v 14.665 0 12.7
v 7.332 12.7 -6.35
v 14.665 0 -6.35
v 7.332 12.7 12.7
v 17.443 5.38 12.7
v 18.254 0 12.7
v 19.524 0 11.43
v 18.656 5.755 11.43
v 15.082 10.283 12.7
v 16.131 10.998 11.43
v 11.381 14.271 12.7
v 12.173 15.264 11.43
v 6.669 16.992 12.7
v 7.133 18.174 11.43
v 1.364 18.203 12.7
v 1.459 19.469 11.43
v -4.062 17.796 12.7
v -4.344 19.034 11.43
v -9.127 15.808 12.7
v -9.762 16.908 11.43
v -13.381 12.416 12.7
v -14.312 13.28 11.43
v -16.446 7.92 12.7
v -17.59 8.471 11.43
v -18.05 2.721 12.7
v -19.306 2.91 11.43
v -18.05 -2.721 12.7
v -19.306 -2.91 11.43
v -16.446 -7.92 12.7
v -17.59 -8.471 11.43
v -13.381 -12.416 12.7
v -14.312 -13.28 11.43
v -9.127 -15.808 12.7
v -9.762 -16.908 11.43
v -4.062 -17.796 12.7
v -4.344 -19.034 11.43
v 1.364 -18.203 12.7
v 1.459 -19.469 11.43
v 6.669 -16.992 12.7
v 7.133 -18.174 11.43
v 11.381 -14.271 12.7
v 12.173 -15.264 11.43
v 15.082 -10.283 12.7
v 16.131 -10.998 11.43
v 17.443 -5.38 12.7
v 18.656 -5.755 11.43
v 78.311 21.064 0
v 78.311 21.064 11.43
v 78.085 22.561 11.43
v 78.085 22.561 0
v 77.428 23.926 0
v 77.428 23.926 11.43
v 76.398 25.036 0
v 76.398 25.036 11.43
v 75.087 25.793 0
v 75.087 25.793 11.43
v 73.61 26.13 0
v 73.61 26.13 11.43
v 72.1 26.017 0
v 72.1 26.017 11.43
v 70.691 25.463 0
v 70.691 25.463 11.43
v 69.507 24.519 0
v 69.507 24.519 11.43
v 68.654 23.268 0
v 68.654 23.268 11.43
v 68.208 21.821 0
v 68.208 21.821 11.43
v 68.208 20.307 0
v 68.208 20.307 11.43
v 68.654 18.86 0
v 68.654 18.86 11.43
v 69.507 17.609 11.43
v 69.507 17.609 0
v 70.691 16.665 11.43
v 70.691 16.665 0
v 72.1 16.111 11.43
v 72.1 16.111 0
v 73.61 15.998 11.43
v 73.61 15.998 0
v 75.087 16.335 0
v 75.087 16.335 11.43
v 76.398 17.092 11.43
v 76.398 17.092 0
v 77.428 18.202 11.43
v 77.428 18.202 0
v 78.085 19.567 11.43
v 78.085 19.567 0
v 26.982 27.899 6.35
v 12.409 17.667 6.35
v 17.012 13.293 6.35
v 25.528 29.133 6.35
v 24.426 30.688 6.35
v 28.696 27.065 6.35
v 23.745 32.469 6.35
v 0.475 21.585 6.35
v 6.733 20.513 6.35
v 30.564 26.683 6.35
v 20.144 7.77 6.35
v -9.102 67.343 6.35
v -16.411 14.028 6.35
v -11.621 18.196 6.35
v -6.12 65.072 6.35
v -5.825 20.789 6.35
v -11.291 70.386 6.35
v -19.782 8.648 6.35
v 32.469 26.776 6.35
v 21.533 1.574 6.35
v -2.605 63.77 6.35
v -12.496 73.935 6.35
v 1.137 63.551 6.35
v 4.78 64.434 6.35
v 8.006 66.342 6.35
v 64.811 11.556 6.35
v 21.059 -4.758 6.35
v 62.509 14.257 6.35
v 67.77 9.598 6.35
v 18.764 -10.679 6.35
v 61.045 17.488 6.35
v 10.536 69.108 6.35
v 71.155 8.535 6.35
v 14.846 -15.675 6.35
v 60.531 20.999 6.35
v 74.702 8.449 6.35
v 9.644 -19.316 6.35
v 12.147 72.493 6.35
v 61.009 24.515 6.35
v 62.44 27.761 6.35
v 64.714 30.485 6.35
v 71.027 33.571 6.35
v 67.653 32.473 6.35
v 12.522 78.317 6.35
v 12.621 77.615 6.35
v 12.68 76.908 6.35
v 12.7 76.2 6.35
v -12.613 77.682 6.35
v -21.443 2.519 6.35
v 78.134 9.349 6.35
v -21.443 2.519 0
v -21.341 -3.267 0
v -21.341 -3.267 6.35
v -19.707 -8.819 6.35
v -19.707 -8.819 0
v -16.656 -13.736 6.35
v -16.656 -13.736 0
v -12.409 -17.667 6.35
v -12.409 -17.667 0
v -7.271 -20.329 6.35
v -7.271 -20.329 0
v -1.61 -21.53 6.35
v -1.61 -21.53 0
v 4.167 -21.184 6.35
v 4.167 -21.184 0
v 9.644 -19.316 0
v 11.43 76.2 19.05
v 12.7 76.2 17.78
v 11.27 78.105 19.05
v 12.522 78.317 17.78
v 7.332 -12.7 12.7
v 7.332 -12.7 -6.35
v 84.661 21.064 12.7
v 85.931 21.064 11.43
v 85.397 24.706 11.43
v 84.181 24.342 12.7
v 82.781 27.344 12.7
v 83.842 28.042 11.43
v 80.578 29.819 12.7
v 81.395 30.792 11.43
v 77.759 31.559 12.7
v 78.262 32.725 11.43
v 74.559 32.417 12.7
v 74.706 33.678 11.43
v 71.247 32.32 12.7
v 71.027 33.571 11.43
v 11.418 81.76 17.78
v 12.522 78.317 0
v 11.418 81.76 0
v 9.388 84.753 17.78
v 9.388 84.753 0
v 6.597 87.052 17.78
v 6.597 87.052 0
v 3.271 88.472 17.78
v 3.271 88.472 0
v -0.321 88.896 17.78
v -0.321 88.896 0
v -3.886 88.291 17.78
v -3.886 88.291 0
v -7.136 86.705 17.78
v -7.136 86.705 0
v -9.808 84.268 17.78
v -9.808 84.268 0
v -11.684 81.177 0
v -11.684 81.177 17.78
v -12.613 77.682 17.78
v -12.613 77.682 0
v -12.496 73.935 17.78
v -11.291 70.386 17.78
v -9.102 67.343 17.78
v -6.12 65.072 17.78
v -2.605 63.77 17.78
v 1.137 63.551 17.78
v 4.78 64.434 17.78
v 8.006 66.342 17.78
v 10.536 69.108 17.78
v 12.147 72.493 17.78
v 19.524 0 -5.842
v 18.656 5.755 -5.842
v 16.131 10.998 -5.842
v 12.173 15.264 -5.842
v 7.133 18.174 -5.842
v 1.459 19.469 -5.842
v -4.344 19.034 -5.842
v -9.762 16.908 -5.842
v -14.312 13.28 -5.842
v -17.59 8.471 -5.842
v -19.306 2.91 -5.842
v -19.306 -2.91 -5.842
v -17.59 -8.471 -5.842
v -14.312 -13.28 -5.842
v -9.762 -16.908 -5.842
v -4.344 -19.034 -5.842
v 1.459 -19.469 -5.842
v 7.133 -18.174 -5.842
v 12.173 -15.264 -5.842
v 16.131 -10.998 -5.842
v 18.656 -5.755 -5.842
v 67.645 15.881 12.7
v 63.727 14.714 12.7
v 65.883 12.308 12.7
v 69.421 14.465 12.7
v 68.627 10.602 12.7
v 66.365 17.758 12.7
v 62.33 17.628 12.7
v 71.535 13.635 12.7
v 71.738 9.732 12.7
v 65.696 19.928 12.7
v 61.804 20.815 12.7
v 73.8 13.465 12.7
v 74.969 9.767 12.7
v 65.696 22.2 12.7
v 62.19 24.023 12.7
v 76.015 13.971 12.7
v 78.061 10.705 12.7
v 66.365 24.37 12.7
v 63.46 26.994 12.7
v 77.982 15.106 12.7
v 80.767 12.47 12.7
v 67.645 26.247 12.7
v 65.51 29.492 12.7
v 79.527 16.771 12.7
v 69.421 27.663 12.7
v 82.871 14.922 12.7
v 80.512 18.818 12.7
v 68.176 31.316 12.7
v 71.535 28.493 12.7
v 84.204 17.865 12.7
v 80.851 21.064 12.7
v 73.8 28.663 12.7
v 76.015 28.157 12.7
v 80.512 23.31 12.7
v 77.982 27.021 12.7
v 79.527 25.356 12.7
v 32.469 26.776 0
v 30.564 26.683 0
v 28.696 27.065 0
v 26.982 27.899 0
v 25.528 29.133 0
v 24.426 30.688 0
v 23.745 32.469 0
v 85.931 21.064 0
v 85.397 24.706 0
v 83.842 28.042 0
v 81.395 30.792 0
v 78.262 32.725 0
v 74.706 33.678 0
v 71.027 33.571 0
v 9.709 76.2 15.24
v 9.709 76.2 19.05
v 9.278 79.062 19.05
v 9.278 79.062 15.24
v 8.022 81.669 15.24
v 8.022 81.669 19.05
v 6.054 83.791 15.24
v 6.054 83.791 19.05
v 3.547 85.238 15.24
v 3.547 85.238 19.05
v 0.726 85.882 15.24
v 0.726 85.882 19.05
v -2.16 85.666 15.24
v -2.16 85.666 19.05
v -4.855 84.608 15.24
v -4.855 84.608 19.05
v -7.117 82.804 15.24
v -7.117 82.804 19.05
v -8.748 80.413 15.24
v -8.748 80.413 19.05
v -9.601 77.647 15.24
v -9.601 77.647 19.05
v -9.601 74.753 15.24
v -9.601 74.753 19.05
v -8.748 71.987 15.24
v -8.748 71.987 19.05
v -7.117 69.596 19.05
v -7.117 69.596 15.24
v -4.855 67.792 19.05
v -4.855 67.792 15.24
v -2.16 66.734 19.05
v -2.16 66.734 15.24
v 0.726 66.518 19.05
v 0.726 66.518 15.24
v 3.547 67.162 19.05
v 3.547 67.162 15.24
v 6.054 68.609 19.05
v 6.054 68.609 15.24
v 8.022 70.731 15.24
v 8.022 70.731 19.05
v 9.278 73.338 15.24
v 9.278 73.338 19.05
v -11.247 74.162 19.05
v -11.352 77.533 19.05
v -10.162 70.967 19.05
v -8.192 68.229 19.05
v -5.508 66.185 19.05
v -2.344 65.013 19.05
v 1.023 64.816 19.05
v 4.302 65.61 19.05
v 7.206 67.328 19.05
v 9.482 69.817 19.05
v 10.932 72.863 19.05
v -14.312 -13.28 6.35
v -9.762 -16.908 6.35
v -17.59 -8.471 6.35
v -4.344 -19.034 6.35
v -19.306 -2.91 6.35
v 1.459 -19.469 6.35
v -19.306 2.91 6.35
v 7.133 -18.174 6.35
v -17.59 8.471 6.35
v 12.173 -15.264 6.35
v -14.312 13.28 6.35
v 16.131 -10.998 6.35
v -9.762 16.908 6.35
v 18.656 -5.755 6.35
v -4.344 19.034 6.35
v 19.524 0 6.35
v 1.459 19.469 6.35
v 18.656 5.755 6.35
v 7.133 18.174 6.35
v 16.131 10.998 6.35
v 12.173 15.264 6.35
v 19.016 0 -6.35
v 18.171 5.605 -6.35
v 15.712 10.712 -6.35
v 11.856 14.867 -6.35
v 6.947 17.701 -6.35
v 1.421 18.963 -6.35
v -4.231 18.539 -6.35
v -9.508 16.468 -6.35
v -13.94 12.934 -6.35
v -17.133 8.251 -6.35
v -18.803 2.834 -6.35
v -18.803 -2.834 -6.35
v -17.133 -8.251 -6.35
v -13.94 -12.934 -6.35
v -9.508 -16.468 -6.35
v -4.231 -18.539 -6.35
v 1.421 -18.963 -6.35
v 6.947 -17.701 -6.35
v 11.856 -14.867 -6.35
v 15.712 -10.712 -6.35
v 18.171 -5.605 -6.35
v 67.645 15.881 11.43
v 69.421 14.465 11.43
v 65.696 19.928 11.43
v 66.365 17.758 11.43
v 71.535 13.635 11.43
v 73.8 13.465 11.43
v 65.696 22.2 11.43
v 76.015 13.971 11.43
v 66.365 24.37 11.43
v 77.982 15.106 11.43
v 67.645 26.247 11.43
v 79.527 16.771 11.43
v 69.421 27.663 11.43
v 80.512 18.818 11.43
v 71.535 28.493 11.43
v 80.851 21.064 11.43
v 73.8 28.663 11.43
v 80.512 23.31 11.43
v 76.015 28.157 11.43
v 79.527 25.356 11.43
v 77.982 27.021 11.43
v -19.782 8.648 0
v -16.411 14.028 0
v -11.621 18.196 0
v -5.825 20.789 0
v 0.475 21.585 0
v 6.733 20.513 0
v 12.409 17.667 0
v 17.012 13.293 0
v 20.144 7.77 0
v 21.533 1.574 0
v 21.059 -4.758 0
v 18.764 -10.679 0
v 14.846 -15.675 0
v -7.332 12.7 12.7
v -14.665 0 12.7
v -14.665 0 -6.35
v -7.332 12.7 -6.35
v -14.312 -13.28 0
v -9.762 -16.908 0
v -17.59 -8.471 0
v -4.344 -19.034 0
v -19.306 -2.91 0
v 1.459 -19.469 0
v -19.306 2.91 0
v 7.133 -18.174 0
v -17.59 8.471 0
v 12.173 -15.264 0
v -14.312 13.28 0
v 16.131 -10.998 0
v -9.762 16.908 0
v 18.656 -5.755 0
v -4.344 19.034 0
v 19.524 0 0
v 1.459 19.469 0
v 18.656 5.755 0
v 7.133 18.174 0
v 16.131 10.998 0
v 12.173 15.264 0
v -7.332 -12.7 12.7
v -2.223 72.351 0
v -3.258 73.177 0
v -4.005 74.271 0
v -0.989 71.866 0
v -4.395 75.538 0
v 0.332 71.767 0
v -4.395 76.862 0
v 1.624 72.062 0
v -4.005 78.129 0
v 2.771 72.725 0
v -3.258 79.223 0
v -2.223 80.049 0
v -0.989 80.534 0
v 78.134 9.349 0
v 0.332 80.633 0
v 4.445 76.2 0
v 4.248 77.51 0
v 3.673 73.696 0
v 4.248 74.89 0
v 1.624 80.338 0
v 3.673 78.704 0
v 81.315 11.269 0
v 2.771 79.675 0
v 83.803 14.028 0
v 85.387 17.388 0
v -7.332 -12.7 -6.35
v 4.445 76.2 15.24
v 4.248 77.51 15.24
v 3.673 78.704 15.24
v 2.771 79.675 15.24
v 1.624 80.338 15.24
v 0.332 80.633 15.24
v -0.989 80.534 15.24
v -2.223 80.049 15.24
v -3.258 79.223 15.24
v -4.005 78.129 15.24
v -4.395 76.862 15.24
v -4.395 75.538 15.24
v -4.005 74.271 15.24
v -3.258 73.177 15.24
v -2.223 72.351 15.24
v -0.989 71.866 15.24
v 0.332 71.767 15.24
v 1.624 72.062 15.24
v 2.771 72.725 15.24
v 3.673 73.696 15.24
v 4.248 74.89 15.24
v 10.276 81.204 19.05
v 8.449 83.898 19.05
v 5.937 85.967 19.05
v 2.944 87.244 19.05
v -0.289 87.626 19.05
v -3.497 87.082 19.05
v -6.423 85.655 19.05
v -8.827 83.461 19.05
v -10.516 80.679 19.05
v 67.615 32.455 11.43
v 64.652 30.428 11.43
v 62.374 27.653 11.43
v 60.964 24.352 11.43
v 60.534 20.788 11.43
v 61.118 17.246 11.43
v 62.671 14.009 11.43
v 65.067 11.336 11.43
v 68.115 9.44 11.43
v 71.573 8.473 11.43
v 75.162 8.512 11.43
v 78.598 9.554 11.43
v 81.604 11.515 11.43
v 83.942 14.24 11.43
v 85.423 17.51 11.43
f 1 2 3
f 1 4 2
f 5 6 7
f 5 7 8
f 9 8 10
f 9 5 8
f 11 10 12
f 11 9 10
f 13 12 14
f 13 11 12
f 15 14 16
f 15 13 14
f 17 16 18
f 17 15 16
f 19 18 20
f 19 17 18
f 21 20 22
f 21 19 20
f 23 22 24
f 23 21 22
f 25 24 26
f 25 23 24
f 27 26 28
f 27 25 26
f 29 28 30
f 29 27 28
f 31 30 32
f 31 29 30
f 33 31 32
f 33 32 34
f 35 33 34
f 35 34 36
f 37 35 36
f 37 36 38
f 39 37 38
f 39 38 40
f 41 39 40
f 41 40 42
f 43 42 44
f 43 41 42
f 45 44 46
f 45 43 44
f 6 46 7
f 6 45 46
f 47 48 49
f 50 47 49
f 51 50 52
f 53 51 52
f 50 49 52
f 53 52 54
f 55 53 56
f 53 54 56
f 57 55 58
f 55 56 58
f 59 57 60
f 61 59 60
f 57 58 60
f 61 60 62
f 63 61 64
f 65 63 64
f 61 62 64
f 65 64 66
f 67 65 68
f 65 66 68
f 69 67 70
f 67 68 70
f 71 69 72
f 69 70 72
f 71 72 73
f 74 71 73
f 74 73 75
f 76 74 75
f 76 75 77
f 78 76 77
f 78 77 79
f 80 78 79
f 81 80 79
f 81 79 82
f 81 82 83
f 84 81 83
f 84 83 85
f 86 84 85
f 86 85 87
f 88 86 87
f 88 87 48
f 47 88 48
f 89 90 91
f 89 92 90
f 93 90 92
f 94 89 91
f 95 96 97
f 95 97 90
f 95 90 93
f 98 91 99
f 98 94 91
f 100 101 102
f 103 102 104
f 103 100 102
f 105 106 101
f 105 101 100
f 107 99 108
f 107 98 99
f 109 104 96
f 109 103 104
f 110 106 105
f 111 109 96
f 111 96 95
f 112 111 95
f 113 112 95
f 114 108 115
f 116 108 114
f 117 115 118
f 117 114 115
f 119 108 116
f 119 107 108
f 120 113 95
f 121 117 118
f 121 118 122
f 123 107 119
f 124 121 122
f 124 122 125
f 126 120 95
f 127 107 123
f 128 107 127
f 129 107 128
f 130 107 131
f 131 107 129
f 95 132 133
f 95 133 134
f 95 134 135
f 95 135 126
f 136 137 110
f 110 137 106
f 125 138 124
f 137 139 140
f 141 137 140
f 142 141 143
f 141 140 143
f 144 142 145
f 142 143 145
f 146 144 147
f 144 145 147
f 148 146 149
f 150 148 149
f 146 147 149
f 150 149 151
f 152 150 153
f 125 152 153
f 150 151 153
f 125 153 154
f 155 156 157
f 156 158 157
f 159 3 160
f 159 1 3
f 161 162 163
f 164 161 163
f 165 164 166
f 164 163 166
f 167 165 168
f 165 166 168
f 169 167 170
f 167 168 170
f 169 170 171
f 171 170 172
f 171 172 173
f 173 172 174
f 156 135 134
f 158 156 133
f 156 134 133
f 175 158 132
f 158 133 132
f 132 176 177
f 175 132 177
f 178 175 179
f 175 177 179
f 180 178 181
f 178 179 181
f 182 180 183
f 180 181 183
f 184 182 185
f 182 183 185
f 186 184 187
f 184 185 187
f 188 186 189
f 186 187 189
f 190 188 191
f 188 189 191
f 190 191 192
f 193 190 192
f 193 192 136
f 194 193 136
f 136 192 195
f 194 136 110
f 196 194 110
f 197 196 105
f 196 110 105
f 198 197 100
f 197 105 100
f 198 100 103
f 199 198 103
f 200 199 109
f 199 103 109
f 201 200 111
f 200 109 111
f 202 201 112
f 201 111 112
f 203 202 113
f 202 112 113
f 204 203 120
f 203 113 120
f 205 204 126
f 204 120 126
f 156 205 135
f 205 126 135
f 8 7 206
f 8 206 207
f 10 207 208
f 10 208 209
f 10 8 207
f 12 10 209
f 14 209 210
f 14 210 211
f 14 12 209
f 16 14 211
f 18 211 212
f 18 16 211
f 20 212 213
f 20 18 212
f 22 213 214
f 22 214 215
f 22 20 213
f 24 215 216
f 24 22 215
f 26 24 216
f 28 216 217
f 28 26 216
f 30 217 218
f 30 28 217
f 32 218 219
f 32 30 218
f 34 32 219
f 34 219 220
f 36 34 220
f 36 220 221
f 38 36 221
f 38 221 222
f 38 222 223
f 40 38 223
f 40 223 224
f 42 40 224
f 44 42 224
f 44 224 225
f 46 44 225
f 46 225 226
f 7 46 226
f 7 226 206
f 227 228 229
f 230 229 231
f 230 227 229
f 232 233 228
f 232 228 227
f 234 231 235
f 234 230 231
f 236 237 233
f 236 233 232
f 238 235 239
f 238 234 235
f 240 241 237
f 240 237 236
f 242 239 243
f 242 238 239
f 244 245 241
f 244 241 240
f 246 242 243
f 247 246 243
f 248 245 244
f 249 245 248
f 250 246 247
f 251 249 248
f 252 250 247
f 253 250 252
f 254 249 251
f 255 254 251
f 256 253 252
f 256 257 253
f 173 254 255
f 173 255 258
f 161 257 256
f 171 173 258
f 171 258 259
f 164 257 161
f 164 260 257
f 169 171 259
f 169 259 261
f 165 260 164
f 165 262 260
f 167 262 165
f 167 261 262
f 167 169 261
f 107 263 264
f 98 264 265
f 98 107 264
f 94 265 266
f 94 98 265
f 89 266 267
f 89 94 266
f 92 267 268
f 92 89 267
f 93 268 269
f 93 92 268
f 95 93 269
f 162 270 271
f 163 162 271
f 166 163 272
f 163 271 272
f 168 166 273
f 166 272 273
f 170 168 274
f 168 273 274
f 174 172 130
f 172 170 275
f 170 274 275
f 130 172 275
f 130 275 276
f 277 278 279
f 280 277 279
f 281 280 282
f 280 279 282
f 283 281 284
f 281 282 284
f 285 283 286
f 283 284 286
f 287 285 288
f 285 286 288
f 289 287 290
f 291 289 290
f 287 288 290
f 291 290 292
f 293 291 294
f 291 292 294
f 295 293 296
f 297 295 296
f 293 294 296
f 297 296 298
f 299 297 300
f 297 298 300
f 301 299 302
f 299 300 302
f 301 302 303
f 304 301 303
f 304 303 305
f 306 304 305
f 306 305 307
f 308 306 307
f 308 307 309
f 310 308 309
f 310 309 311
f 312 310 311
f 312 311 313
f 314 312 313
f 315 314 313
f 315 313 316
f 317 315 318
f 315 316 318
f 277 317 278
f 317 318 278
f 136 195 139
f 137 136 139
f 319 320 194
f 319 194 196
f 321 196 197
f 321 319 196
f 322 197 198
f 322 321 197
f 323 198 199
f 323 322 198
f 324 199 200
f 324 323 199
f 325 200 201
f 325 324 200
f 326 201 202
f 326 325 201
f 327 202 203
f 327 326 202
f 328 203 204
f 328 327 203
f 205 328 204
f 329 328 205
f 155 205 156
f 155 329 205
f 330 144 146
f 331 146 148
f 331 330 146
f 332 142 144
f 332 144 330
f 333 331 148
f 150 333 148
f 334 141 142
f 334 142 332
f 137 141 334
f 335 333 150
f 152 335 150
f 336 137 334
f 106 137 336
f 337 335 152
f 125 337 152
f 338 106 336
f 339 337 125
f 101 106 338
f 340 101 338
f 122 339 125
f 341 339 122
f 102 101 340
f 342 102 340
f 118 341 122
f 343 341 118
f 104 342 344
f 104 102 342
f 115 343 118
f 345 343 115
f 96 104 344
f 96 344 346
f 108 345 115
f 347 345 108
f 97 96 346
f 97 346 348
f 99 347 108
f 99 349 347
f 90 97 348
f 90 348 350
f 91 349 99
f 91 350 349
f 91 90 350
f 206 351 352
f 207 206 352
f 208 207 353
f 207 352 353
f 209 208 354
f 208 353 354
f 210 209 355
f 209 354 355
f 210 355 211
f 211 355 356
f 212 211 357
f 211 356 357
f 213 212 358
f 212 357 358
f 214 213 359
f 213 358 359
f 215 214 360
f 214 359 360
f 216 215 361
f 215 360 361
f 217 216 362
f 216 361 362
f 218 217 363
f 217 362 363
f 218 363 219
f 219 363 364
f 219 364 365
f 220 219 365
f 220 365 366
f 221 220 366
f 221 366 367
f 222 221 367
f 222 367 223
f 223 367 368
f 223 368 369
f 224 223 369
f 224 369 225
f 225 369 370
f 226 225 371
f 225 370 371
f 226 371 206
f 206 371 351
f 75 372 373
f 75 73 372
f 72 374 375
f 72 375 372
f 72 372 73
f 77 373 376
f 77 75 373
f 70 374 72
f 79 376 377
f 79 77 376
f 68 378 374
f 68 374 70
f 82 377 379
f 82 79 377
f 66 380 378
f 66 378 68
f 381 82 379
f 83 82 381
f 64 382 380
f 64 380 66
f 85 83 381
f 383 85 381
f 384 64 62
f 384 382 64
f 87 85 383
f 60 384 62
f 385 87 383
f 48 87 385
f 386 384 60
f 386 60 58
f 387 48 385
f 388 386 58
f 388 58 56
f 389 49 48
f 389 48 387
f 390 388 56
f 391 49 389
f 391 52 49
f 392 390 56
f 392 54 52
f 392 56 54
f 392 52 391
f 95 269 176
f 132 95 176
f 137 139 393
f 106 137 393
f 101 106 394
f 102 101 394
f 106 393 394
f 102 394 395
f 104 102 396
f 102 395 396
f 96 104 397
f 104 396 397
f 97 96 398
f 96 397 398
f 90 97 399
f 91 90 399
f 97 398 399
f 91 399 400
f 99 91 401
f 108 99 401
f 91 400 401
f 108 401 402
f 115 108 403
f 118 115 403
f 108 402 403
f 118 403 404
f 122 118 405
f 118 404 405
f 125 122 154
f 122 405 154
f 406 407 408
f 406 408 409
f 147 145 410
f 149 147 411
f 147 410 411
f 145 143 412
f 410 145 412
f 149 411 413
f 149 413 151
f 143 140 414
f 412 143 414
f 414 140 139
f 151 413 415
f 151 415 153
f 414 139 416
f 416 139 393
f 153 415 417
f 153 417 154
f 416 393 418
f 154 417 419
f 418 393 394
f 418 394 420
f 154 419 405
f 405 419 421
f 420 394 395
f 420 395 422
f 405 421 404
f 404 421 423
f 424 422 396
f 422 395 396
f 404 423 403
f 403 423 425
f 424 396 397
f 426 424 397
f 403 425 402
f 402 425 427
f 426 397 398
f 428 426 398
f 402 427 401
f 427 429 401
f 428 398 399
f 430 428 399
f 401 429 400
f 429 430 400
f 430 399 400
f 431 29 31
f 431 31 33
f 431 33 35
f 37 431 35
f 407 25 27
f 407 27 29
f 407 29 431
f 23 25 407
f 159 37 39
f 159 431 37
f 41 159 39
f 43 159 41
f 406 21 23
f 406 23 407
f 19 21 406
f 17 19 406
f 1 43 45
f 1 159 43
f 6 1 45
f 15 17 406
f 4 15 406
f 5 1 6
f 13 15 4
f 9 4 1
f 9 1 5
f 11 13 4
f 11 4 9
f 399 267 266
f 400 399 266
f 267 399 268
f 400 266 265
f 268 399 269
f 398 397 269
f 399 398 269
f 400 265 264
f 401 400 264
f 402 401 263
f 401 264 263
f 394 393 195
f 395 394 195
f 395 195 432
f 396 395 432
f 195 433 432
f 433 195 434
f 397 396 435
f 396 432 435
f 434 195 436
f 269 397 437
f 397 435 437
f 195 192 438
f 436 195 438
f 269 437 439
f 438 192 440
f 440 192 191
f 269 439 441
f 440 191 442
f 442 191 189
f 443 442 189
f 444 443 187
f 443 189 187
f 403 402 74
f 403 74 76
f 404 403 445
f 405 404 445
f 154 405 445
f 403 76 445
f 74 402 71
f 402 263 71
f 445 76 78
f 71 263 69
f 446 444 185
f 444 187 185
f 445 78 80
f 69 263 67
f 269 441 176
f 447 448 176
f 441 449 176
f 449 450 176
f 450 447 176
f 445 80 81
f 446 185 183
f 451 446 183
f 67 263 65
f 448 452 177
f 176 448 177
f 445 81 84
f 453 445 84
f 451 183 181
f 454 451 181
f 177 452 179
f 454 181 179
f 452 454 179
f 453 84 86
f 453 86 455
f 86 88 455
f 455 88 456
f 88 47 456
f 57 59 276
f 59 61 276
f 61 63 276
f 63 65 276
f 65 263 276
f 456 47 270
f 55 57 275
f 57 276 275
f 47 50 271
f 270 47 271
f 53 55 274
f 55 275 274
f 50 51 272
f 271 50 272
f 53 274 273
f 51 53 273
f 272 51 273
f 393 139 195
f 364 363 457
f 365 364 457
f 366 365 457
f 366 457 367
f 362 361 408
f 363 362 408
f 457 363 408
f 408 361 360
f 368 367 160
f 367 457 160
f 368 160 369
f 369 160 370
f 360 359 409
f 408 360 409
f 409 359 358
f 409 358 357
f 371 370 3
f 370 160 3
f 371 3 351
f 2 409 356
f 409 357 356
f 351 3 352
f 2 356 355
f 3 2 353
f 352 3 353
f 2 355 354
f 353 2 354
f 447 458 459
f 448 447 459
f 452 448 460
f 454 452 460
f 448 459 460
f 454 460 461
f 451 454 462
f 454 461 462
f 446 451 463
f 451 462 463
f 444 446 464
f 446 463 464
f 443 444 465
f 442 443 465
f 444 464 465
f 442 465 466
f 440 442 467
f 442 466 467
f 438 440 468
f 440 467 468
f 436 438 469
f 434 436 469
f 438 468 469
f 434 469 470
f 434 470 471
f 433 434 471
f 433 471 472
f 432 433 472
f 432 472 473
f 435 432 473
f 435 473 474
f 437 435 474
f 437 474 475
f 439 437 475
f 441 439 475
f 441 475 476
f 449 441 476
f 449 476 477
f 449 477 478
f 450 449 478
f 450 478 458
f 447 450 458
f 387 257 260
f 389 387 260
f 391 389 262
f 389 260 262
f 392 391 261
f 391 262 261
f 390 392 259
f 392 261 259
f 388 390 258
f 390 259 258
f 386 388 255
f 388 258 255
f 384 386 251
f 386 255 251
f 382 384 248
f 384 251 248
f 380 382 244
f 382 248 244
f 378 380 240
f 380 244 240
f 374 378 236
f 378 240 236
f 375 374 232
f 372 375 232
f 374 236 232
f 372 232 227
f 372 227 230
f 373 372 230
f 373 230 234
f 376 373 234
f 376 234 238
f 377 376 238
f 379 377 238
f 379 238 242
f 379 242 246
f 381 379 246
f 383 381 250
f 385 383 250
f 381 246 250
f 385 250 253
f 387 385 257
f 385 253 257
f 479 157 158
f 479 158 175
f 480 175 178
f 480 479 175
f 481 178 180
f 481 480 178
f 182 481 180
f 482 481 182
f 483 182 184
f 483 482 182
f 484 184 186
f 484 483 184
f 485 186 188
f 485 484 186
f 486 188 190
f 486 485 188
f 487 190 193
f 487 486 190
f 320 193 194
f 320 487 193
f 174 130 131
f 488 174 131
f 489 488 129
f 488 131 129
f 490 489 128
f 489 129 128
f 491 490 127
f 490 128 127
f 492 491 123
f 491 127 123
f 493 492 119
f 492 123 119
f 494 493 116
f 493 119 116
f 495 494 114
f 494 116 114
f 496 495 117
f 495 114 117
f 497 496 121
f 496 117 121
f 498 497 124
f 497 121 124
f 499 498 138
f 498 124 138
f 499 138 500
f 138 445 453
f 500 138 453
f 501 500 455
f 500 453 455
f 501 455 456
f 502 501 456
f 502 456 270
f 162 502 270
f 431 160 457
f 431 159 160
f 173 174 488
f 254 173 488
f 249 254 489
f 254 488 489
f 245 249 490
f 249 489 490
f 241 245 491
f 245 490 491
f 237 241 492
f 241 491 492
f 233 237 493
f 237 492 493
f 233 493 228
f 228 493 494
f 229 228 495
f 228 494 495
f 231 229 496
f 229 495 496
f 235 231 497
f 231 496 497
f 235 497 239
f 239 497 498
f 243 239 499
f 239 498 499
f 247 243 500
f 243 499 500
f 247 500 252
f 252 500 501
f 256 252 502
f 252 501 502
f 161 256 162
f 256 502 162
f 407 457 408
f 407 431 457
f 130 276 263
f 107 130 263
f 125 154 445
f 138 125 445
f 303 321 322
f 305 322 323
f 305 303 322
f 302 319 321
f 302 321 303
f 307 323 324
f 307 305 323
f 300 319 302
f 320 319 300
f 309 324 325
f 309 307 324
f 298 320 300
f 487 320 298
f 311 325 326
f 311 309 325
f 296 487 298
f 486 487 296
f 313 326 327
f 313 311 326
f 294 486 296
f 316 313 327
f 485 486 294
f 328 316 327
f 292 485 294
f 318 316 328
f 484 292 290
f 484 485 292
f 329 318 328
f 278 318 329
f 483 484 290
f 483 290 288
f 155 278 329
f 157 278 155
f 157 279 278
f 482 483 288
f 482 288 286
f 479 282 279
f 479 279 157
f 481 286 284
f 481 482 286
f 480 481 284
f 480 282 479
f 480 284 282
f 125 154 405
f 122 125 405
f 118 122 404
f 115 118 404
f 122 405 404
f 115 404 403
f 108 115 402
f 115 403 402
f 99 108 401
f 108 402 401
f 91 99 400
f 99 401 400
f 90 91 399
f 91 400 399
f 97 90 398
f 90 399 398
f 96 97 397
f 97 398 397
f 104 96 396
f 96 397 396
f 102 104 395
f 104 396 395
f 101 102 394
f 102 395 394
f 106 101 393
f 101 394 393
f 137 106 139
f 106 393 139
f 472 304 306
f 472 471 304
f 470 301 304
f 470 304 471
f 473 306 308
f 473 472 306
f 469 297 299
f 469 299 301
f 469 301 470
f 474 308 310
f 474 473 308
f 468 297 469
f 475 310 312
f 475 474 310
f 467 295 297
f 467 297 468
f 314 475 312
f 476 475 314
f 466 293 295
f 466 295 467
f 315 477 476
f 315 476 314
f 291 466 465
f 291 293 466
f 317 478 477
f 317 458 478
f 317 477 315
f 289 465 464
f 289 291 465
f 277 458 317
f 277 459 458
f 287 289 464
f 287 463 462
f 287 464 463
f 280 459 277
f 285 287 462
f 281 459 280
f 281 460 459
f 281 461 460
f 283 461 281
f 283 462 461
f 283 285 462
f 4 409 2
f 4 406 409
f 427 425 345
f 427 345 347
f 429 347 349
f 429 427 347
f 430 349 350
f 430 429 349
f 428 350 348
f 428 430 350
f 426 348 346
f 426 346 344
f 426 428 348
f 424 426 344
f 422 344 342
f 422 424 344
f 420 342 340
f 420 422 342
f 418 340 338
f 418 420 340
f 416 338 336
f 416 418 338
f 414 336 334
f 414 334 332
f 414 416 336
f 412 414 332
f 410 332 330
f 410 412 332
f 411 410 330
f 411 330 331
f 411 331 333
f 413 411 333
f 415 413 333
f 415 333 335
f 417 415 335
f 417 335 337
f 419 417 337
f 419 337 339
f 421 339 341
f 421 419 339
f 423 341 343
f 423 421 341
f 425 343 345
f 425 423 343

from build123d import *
from build123d import SkipClean  # not in build123d's __all__

# Parameters (mm, degrees)
F1_DEPTH  = 6.35
F0_R      = 19.5237916893
F2_DEPTH  = 12.7
F3_DEPTH  = 6.35
F4_DEPTH  = 12.7
F5_SIZE   = 1.27
F5_2_SIZE = 1.27
F6_R      = 4.445
F7_DEPTH  = 25.4
F8_R      = 9.7090709229
F9_DEPTH  = 3.81
F10_R     = 5.08
F11_DEPTH = 25.4
F10_R_2   = 7.62
F12_DEPTH = 1.27
F13_DEPTH = 6.35
F14_DEPTH = 6.35
F15_R     = 7.62
F16_SIZE  = 0.508


# Not quite as in the source:
# - after a boolean that leaves OpenCascade's solid faulty, fix() repairs it
# - a feature names something its author has since deleted; it is built from what else it names


with BuildPart() as f1:
    # F0 (on Top) → F1 (new body)
    with BuildSketch(Plane.XY):
        with BuildLine():
            ThreePointArc((12.5223688742, 78.3166666667), (12.6555143061, 77.2620535056), (12.7, 76.2))
            ThreePointArc((12.7, 76.2), (-0.7421013455, 63.5217002089), (-12.6132733217, 77.6816666667))
            Line((-12.6132733217, 77.6816666667), (-21.442564647, 2.5188333333))
            ThreePointArc((-21.442564647, 2.5188333333), (1.2615722873, 21.5531096449), (21.59, 0))
            ThreePointArc((21.59, 0), (18.3622941649, -11.3558026137), (9.644260954, -19.3162193674))
            Line((9.644260954, -19.3162193674), (78.13398925, 9.348603097))
            ThreePointArc((78.13398925, 9.348603097), (61.0445484479, 17.4882981523), (71.0267201121, 33.5712043384))
            Line((71.0267201121, 33.5712043384), (25.4411503373, 25.5379192568))
            Line((25.4411503373, 25.5379192568), (12.5223688742, 78.3166666667))
        make_face()
    extrude(amount=F1_DEPTH)

    # F0 (on Top) → F2, piece 2 (join)
    with BuildSketch(Plane.XY):
        with BuildLine():
            ThreePointArc((-12.6132733217, 77.6816666667), (-0.7421013455, 63.5217002089), (12.7, 76.2))
            ThreePointArc((12.7, 76.2), (12.6555143061, 77.2620535056), (12.5223688742, 78.3166666667))
            ThreePointArc((12.5223688742, 78.3166666667), (-0.3207368932, 88.8959492692), (-12.6132733217, 77.6816666667))
        make_face()
    extrude(amount=F2_DEPTH)

    # F3 (add): a face of the model
    f3_faces = [f1.faces().sort_by_distance(p)[0] for p in [
        (0, 76.2, 12.7),
    ]]
    with SkipClean():  # cleaning this boolean's faces spoils the solid; the shape is the same uncleaned
        extrude(f3_faces, amount=F3_DEPTH)

    # F0 (on Top) → F4 (join)
    with BuildSketch(Plane.XY):
        with BuildLine():
            ThreePointArc((85.9308064152, 21.0639263144), (81.3946934781, 30.792284245), (71.0267201121, 33.5712043384))
            ThreePointArc((71.0267201121, 33.5712043384), (61.0445484479, 17.4882981523), (78.13398925, 9.348603097))
            ThreePointArc((78.13398925, 9.348603097), (83.8034225059, 14.0276070352), (85.9308064152, 21.0639263144))
        make_face()
    extrude(amount=F4_DEPTH)

    add(f1.part.fix(), mode=Mode.REPLACE)

    # F5
    f5_edges = [f1.edges().sort_by_distance(p)[0] for p in [
        (-12.7, 76.2, 19.05),
        (68.327624, 32.77925, 12.7),
    ]]
    chamfer(f5_edges, length=F5_SIZE)

    # F6 (on face) → F7 (cut)
    with BuildSketch(Plane.XY.offset(19.05)):
        with Locations((0, 76.2)):
            Circle(F6_R)
    extrude(amount=-F7_DEPTH, mode=Mode.SUBTRACT)

    # F8 (on face) → F9 (cut)
    with BuildSketch(Plane.XY.offset(19.05)):
        with Locations((0, 76.2)):
            Circle(F8_R)
    extrude(amount=-F9_DEPTH, mode=Mode.SUBTRACT)

    # F10 (on face) → F11 (cut)
    with BuildSketch(Plane.XY.offset(12.7)):
        with Locations((73.2308064152, 21.0639263144)):
            Circle(F10_R)
    extrude(amount=-F11_DEPTH, mode=Mode.SUBTRACT)

    # F10 (on face) → F12 (cut)
    with BuildSketch(Plane.XY.offset(12.7)):
        with Locations((73.2308064152, 21.0639263144)):
            Circle(F10_R_2)
        with Locations((73.2308064152, 21.0639263144)):
            Circle(F10_R, mode=Mode.SUBTRACT)
    extrude(amount=-F12_DEPTH, mode=Mode.SUBTRACT)

    # F15
    f15_edges = [f1.edges().sort_by_distance(p)[0] for p in [
        (25.44115, 25.537919, 3.175),
    ]]
    fillet(f15_edges, radius=F15_R)


with BuildPart() as f2:
    # F0 (on Top) → F2 (new body)
    with BuildSketch(Plane.XY):
        Circle(F0_R)
        Polygon((-14.6646968374, 0), (-7.3323484187, 12.7), (7.3323484187, 12.7), (14.6646968374, 0), (7.3323484187, -12.7), (-7.3323484187, -12.7), align=None, mode=Mode.SUBTRACT)
    extrude(amount=F2_DEPTH)

    # F5#2
    f5_2_edges = [f2.edges().sort_by_distance(p)[0] for p in [
        (-19.523792, 0, 12.7),
    ]]
    chamfer(f5_2_edges, length=F5_2_SIZE)

    # F14 (add): a face of the model
    f14_faces = [f2.faces().sort_by_distance(p)[0] for p in [
        (-18.9715754694, 0, 0),
    ]]
    extrude(f14_faces, amount=F14_DEPTH)

    # F16
    f16_edges = [f2.edges().sort_by_distance(p)[0] for p in [
        (-19.523792, 0, -6.35),
    ]]
    chamfer(f16_edges, length=F16_SIZE)


with BuildPart() as f13:
    # F0 (on Top) → F13 (new body)
    with BuildSketch(Plane.XY):
        with BuildLine():
            ThreePointArc((21.59, 0), (1.2615722873, 21.5531096449), (-21.442564647, 2.5188333333))
            ThreePointArc((-21.442564647, 2.5188333333), (-12.4093663867, -17.6673632974), (9.644260954, -19.3162193674))
            ThreePointArc((9.644260954, -19.3162193674), (18.3622941649, -11.3558026137), (21.59, 0))
        make_face()
        Circle(F0_R, mode=Mode.SUBTRACT)
    extrude(amount=F13_DEPTH)


solid = Compound([f1.part, f2.part, f13.part])
